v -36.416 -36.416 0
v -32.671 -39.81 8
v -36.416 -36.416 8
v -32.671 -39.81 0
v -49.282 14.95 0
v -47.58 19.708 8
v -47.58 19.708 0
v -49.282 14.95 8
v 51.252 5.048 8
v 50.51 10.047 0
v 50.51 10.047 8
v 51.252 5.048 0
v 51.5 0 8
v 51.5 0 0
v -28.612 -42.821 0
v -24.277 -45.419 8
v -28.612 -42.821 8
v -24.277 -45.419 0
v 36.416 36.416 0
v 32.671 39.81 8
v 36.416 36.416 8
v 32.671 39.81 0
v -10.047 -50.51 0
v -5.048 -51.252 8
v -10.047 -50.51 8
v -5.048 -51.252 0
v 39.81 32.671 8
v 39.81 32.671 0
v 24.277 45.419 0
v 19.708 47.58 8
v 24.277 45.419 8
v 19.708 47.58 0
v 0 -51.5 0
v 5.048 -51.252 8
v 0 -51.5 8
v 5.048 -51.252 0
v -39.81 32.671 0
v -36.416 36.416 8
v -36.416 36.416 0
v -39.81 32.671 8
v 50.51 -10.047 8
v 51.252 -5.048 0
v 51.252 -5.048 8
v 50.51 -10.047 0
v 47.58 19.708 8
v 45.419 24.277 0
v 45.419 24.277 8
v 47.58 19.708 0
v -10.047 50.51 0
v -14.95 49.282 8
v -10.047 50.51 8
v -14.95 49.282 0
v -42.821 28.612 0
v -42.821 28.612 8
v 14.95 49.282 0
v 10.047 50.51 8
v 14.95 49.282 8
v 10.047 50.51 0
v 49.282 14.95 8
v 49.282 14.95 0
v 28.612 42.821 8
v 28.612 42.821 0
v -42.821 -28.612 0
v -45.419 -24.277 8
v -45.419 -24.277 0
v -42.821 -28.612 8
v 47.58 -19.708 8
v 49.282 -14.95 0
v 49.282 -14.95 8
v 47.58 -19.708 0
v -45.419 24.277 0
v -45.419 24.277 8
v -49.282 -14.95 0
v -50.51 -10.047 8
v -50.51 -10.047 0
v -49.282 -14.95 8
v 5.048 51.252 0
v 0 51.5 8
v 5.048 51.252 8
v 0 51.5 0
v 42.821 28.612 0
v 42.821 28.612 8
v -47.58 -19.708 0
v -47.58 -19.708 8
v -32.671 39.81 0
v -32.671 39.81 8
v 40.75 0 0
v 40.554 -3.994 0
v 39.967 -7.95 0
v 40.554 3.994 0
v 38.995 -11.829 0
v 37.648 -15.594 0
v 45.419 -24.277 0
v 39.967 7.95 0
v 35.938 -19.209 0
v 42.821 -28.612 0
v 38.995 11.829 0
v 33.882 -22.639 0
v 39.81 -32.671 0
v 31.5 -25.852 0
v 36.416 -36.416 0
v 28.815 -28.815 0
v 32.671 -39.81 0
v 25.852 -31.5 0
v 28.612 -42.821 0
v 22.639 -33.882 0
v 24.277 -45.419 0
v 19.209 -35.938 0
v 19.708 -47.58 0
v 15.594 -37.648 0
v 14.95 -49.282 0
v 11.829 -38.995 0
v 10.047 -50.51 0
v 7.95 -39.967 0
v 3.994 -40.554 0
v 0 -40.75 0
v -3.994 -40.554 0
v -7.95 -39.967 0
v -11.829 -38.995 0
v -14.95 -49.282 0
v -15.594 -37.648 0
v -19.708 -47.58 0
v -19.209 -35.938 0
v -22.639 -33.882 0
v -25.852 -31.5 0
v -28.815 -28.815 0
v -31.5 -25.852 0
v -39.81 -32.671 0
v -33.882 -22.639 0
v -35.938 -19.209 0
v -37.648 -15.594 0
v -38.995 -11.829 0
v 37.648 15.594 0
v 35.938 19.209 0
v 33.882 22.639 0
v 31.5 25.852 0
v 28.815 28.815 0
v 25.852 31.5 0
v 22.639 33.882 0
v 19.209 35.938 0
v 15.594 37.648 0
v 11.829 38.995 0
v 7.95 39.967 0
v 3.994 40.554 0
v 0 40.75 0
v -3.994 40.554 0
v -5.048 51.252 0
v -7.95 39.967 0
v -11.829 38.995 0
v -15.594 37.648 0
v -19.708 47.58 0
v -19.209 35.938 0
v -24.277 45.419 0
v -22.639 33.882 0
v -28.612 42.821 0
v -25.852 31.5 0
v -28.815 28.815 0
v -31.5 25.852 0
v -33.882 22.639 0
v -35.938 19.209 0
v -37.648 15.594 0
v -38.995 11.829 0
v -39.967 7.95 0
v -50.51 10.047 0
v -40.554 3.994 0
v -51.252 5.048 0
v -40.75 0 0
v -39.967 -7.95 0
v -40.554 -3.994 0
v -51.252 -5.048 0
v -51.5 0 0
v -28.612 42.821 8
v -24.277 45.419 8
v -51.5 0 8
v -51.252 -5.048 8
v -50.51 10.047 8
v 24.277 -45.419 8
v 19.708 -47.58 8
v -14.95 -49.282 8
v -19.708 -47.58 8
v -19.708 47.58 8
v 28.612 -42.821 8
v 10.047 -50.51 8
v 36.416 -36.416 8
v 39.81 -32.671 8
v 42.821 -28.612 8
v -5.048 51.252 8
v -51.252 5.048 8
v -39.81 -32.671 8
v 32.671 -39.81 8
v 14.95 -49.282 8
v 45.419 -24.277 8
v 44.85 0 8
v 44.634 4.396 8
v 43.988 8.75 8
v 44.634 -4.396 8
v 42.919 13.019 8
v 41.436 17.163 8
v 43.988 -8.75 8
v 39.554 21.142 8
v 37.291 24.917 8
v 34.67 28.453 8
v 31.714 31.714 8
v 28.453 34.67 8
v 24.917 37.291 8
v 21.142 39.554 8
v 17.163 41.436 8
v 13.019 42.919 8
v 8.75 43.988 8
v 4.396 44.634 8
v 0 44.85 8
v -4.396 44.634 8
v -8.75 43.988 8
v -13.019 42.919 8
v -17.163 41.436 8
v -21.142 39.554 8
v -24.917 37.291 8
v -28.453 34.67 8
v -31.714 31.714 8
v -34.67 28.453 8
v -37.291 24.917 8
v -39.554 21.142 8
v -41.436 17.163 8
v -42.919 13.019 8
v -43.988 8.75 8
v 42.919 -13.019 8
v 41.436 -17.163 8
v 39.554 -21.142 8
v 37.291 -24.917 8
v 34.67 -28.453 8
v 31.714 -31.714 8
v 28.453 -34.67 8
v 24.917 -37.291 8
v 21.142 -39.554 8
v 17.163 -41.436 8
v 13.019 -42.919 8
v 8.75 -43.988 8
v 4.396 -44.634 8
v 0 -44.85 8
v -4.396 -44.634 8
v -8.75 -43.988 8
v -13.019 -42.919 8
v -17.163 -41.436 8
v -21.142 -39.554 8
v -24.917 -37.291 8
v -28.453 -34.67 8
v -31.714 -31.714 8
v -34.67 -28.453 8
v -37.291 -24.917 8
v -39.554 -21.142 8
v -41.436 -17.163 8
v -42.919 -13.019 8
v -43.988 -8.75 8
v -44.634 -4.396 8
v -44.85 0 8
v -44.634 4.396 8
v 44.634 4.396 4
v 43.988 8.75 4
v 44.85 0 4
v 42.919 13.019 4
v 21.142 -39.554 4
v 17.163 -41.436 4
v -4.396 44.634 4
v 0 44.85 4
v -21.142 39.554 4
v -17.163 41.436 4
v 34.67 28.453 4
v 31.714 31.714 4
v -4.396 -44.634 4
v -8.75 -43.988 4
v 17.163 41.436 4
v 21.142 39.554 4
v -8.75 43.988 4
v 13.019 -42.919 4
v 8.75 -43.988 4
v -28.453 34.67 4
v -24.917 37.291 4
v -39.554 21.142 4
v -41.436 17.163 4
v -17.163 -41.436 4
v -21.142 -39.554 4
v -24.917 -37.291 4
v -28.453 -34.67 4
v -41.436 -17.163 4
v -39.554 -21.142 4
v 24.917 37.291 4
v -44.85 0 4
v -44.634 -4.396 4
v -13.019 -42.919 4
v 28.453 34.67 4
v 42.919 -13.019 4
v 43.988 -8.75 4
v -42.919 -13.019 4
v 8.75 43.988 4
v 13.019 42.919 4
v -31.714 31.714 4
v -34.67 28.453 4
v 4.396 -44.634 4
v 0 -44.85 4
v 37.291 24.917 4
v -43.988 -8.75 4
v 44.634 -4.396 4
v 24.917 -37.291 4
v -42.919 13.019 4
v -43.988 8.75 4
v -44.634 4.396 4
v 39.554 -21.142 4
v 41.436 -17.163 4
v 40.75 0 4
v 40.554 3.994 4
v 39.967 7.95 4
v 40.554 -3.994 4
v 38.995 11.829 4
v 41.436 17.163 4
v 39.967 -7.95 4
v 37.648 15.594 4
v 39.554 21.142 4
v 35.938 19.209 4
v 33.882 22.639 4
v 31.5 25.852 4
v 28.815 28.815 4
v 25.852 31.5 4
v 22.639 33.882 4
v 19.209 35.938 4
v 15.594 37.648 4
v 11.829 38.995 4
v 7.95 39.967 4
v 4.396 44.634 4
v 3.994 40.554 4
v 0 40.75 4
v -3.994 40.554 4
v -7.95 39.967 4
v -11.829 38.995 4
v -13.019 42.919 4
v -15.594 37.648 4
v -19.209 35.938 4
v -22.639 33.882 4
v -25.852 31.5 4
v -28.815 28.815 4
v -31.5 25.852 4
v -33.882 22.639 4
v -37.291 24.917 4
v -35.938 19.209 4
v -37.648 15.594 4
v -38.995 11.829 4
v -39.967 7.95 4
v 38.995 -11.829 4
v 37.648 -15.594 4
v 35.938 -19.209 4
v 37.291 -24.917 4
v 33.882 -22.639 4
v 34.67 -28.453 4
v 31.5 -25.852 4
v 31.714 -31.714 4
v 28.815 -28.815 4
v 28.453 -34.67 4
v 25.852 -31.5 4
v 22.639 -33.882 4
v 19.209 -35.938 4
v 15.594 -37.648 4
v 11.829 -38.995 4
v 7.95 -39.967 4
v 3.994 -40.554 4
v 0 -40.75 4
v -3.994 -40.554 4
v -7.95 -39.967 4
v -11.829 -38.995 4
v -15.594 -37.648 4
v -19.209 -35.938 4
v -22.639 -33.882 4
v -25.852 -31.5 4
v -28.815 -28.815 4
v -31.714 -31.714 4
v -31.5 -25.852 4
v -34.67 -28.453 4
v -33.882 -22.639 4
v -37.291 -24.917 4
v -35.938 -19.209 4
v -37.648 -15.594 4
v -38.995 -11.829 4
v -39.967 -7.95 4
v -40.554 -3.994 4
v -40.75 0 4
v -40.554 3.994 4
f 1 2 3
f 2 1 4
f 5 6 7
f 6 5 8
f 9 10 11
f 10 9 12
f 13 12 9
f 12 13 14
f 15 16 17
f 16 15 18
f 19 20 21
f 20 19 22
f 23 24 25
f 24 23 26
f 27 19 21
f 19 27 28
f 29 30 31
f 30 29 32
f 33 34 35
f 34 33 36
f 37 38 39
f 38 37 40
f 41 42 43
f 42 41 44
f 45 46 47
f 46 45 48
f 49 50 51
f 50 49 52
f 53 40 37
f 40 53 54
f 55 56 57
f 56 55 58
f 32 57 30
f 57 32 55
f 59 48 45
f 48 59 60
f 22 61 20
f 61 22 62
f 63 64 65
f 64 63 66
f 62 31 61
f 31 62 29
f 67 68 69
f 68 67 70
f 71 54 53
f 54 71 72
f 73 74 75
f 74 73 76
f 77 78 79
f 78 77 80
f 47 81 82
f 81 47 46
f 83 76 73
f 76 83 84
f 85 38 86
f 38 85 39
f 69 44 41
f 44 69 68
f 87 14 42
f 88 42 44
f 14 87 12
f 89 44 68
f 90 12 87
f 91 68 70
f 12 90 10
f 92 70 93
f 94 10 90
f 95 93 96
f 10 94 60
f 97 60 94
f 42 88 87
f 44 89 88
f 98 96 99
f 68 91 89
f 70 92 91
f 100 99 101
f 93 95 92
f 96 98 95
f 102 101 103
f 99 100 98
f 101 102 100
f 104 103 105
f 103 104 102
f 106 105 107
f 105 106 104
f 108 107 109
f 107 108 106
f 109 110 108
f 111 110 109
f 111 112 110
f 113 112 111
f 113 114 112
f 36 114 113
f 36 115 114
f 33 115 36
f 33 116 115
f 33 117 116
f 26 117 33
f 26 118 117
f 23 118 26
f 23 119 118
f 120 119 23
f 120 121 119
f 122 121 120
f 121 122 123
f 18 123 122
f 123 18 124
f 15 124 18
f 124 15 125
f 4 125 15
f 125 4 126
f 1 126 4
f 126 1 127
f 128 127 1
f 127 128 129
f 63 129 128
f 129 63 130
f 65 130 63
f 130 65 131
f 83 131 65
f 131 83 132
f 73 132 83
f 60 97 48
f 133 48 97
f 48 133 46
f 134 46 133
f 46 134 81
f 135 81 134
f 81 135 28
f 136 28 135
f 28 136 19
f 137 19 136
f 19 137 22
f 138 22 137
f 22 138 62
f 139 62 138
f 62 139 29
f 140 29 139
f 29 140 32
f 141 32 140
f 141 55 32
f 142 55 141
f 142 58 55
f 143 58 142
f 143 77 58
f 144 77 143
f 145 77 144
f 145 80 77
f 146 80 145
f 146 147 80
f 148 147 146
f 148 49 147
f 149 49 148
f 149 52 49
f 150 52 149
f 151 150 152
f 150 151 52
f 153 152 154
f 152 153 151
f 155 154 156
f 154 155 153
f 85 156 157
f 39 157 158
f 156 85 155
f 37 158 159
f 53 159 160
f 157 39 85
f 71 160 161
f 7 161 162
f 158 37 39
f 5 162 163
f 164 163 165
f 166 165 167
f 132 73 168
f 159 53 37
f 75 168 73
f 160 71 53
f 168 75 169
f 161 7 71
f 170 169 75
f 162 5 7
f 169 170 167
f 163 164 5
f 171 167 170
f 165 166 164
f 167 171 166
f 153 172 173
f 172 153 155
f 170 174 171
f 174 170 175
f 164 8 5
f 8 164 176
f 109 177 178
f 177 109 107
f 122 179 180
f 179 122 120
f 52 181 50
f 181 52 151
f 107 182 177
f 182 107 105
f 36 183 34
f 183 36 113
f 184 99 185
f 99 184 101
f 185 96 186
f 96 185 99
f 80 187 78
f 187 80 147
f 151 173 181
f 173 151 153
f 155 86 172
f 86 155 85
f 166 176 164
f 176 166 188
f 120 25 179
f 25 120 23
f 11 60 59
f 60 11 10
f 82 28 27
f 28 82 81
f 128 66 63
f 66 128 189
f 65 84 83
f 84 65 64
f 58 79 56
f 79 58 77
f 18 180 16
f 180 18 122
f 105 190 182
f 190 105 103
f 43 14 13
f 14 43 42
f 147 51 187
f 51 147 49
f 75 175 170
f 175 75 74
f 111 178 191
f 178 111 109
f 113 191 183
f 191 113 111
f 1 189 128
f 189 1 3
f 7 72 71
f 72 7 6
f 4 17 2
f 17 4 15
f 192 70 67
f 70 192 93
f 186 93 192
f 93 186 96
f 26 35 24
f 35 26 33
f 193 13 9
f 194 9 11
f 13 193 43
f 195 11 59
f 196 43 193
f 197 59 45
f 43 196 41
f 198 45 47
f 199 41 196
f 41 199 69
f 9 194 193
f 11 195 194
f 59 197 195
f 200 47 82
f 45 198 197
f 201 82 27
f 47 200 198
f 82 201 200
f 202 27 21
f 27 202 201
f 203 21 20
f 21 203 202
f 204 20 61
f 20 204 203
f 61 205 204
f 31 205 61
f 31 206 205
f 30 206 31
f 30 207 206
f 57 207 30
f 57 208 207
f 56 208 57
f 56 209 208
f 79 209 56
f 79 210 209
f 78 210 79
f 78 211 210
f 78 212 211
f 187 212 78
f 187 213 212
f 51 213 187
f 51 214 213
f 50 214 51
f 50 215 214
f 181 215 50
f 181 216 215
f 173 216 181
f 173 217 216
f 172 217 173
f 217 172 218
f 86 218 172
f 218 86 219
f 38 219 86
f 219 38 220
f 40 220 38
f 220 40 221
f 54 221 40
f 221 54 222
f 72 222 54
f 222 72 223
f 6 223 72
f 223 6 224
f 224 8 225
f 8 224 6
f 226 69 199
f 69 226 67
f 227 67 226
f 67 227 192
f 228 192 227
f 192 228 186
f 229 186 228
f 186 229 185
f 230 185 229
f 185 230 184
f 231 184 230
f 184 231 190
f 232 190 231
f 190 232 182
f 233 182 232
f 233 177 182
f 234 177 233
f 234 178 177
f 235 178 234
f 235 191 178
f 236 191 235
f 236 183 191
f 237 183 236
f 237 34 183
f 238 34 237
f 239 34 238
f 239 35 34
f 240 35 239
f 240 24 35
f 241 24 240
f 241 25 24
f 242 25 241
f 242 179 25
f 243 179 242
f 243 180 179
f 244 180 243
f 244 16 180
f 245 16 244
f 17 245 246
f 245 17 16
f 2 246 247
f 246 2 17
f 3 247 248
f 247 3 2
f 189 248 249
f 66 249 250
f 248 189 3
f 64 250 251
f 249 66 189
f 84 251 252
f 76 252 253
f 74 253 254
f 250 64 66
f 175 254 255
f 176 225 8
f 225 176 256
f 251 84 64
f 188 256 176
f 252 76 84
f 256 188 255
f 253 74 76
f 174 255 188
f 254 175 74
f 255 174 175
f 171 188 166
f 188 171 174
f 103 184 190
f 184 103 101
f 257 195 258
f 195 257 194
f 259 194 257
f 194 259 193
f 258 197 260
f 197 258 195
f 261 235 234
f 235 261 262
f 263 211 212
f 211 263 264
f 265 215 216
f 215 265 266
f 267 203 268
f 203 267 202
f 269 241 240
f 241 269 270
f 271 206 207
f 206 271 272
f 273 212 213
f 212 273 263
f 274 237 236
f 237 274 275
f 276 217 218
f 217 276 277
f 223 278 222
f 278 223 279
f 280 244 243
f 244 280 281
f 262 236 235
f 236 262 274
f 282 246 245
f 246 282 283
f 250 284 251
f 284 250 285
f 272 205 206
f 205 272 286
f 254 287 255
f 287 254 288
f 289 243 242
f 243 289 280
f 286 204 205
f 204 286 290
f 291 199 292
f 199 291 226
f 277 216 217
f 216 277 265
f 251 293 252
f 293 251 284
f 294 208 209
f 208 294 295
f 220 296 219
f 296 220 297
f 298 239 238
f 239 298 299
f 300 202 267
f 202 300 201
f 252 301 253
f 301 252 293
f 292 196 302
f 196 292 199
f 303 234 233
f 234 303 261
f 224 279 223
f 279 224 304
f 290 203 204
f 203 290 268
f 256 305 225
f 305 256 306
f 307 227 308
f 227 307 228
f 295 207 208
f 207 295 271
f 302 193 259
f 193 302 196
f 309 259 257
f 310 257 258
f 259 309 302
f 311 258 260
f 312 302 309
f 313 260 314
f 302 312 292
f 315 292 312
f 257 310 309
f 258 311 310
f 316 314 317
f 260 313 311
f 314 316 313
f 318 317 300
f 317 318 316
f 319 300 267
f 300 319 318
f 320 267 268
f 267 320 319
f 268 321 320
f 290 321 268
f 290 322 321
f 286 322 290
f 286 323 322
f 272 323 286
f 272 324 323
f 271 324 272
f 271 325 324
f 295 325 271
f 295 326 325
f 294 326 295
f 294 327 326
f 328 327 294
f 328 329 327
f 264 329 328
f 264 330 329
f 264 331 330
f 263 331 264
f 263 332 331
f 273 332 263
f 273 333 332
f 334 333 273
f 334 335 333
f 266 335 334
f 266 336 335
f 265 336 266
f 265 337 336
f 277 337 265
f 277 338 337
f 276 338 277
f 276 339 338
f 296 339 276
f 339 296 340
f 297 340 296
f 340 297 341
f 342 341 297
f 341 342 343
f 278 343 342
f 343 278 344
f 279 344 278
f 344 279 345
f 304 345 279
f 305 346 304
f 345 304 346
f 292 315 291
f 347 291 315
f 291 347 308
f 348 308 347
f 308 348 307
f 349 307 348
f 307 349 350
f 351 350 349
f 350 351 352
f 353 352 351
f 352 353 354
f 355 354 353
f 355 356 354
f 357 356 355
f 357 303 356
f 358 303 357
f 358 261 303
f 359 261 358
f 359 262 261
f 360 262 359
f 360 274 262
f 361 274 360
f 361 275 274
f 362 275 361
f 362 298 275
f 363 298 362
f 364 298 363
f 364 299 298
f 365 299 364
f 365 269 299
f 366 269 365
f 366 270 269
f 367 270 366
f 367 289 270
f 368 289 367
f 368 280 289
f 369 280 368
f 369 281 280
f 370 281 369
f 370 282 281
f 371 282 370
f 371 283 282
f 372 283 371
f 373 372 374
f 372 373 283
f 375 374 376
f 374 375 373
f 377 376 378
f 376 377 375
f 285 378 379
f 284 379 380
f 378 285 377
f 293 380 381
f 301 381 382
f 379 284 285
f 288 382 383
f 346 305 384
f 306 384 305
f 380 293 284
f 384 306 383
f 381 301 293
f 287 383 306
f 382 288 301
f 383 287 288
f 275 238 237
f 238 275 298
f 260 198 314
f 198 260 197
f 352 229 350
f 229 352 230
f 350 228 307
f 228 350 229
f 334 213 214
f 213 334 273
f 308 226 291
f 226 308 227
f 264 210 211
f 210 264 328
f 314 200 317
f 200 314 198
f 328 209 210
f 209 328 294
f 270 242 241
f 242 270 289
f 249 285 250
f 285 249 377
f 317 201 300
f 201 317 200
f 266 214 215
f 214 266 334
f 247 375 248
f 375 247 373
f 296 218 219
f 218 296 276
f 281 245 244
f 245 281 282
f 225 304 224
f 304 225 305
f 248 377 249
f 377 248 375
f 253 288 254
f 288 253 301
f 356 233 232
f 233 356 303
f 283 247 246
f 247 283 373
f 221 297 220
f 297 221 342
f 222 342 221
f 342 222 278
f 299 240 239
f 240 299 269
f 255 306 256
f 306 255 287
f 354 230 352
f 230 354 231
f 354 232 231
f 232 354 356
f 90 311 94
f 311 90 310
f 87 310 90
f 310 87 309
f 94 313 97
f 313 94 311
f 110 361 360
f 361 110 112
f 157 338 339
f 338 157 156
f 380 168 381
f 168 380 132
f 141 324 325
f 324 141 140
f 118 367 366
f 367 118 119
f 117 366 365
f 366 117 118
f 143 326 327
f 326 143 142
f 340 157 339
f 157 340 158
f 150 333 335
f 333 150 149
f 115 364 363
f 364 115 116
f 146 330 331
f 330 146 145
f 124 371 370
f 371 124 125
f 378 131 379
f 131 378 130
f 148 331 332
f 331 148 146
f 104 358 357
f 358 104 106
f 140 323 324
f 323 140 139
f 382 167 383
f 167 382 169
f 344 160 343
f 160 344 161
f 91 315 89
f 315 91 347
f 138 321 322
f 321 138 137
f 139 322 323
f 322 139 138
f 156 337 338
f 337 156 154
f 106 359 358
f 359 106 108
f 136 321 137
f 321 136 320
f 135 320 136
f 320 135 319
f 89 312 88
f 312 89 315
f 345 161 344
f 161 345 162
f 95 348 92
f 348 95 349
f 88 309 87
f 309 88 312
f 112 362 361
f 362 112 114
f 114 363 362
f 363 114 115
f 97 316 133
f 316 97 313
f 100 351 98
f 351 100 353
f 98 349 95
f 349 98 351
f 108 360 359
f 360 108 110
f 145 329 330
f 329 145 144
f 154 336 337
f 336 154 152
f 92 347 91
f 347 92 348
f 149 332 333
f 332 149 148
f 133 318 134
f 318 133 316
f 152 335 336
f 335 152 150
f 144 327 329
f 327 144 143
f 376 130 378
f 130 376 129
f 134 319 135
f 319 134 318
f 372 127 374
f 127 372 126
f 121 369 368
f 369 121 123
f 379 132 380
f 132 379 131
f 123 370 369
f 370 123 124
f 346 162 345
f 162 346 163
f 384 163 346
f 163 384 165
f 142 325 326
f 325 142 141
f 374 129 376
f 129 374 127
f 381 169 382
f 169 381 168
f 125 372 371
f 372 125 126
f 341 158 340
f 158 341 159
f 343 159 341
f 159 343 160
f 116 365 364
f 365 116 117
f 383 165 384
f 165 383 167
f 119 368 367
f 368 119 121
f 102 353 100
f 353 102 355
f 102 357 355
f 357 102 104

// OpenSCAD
glass_h = 10;
glass_r = 40.75;

outer_shell_h = 8;
inner_shell_r = glass_r + 2.1;

outer_shell_r = inner_shell_r + 2;

ring_h = 8;
ring_r = 51.5;

roundness = 64;

difference() {
    cylinder(h = ring_h, r = ring_r, $fn = roundness);
    translate([0, 0, (ring_h / 2)]) {
        cylinder(h = outer_shell_h, r = outer_shell_r, $fn = roundness);
    }
    cylinder(h = glass_h, r = glass_r, $fn = roundness);
}
